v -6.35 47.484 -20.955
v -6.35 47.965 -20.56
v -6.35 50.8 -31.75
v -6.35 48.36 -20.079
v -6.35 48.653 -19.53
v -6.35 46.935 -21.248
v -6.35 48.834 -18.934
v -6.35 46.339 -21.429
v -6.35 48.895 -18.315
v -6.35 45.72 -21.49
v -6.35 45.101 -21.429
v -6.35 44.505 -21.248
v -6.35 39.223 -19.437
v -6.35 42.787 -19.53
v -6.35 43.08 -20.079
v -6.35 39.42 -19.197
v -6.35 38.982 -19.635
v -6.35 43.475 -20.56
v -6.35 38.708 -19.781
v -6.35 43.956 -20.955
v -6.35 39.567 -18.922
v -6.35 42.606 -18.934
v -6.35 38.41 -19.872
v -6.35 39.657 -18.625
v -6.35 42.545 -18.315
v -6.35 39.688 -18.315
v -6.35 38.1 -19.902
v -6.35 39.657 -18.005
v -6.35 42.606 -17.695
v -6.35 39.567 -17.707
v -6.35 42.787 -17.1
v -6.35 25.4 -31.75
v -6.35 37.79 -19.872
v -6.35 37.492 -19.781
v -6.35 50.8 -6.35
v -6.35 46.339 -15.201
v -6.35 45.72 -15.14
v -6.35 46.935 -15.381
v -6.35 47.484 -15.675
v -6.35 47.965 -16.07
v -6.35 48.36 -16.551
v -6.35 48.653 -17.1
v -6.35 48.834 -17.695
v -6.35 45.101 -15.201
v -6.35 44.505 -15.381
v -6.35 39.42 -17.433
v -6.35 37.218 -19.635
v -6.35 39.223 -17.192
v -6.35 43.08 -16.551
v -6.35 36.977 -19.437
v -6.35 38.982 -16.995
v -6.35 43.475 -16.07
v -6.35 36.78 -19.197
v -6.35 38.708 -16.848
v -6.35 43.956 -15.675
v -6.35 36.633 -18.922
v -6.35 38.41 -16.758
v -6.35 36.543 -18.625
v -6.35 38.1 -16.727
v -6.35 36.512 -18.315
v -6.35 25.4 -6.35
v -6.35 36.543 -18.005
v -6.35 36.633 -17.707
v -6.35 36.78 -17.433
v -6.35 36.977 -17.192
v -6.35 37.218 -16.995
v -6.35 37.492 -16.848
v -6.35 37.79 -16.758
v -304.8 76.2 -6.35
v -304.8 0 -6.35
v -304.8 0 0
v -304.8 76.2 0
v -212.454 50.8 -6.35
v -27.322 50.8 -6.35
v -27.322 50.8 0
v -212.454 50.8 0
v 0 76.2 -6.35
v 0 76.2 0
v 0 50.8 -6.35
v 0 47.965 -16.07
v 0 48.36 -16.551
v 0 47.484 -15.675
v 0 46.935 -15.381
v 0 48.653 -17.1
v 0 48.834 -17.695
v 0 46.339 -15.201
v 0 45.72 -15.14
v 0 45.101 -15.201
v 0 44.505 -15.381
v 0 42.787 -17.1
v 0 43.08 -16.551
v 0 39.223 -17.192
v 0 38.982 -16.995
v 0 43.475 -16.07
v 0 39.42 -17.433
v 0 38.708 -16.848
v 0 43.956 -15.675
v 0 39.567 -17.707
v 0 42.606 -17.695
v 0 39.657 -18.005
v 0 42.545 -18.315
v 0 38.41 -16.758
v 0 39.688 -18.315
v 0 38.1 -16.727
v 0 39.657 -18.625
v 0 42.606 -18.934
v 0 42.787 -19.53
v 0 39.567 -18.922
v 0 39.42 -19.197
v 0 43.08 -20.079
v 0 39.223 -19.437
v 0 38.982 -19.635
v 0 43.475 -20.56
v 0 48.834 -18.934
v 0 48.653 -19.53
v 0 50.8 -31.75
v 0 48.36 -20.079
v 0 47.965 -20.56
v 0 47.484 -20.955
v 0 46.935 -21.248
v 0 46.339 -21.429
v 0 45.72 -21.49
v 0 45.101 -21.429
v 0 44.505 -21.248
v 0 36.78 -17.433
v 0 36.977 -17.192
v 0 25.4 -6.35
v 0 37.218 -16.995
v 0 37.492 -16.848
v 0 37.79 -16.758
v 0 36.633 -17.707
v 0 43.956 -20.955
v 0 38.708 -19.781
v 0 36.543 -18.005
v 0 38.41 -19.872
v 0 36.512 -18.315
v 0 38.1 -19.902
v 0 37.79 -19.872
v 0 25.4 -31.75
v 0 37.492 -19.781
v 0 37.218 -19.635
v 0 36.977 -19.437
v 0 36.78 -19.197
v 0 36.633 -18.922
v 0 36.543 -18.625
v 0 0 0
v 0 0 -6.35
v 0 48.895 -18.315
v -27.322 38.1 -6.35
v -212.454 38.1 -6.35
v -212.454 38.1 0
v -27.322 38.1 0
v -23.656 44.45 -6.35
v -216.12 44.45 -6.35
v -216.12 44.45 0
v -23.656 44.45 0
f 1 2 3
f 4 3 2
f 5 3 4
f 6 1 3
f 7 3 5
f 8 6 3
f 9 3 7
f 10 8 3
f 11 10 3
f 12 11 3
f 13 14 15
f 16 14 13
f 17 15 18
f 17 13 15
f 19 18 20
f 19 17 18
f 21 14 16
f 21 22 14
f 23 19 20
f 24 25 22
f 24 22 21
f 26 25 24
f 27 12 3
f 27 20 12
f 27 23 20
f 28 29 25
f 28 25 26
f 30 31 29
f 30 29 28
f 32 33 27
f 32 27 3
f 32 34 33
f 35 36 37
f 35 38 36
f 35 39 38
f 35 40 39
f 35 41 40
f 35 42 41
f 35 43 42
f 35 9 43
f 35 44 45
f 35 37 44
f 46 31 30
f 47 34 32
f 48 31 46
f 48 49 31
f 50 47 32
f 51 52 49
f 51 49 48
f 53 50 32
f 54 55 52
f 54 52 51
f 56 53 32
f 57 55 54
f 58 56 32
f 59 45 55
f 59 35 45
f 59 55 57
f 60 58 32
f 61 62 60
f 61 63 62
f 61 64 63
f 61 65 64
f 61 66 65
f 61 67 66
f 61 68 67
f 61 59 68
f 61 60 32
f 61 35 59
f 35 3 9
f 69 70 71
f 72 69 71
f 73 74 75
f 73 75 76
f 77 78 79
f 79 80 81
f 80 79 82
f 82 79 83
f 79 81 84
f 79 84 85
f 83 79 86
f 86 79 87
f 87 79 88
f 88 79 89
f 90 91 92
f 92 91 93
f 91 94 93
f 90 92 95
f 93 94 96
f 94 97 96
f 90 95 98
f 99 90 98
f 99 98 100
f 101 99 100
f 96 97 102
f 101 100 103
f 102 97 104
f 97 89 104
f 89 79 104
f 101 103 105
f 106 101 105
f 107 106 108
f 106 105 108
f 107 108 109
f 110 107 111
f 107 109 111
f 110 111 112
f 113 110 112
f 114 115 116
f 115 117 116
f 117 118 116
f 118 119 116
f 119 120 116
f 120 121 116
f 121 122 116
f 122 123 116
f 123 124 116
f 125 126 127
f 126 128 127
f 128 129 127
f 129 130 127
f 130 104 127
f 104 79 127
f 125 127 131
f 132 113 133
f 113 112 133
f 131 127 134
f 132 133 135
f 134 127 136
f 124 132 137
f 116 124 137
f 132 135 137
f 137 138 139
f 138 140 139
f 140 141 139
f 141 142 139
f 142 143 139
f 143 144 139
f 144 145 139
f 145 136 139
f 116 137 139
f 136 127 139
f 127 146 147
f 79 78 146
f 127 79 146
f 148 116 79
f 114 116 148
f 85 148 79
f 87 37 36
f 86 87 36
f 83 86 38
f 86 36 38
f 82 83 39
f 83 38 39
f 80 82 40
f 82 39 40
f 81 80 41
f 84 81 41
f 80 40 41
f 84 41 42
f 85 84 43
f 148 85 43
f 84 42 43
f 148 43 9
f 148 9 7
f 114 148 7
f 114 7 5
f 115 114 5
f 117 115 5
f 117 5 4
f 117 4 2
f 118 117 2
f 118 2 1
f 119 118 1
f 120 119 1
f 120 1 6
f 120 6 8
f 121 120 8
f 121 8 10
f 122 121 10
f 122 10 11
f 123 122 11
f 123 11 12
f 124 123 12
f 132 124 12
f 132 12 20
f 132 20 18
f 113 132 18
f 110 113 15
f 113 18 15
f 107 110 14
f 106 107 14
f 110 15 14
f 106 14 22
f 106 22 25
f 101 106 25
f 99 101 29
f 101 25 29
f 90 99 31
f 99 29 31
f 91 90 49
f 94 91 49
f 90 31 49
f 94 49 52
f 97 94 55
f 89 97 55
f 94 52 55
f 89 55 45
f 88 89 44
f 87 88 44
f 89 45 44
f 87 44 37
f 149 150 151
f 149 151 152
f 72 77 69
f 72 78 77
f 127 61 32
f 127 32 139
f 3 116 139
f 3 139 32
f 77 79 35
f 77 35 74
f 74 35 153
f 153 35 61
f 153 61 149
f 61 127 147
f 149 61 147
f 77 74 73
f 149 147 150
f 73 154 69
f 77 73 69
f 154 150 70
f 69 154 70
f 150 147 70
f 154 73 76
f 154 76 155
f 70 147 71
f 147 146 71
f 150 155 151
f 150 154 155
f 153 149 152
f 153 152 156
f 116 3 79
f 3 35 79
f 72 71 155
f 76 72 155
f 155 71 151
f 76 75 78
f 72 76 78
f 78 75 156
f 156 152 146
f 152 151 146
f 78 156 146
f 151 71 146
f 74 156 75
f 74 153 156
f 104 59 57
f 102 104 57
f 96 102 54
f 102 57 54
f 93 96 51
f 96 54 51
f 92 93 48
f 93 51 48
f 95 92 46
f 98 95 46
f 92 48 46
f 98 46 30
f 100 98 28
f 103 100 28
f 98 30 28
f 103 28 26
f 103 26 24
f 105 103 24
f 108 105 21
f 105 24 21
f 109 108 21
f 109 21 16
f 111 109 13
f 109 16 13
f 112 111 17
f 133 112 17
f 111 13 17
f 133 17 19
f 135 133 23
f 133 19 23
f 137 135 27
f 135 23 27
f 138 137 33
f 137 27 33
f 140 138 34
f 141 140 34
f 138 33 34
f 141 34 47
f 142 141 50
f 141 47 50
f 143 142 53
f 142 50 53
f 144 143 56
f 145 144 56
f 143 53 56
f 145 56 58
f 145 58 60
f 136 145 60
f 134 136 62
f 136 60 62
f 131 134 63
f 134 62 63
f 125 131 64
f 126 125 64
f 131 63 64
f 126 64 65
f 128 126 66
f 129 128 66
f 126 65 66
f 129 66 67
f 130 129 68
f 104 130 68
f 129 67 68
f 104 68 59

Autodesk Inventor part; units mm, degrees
ref_plane "YZ Plane" through (0, 0, 0) normal (1, 0, 0) x (0, 1, 0)
ref_plane "XZ Plane" through (0, 0, 0) normal (0, 1, 0) x (-1, 0, 0)
ref_plane "XY Plane" through (0, 0, 0) normal (0, 0, 1) x (1, 0, 0)
sketch "Sketch1" plane through (0, 0, 0) normal (0, 1, 0) x (-1, 0, 0)
  line L0 (0, 0) -> (0, -6.35)
  line L1 (0, -6.35) -> (304.8, -6.35)
  line L2 (304.8, -6.35) -> (304.8, 0)
  line L3 (304.8, 0) -> (0, 0)
  dimension "d0" = 6.35
  dimension "d1" = 304.8
extrude "Extrusion1" add sketch "Sketch1" along normal blind 76.2
sketch "Sketch2" plane through (-304.8, 0, 0) normal (0, 0, 1) x (1, 0, 0)
  line L0 (273.812, 50.8) -> (96.012, 50.8)
  line L1 (96.012, 50.8) -> (96.012, 38.1)
  line L2 (96.012, 38.1) -> (273.812, 38.1)
  line L3 (273.812, 38.1) -> (273.812, 50.8)
  line L4 (96.012, 50.8) -> (35.1357, 42.2552)
  line L5 (35.1357, 42.2552) -> (36.5673, 32.0558)
  line L6 (36.5673, 32.0558) -> (97.4436, 40.6006)
  line L7 (97.4436, 40.6006) -> (96.012, 50.8)
  line L8 (0, 76.2) -> (304.8, 76.2) projected
  line L9 (304.8, 0) -> (304.8, 76.2) projected
  dimension "d4" = 177.8
  dimension "d5" = 12.7
  dimension "d24" = 25.4
  dimension "d25" = 30.988
sketch "Sketch3" plane through (-304.8, 0, 0) normal (0, 0, 1) x (1, 0, 0)
  point P0 (304.8, 0)
extrude "Extrusion2" cut sketch "Sketch2" against normal blind 6.35 contours L3 L2 L1 L6 L7 L0 | L7 L6 L1
sketch "Sketch4" plane through (-304.8, 0, 0) normal (0, 0, 1) x (1, 0, 0)
  point P0 (304.8, 0)
sketch "Sketch5" plane through (0, 0, -6.35) normal (0, 0, -1) x (-1, 0, 0)
  line L0 (0, 0) -> (0, 76.2) projected
  line L1 (0, 76.2) -> (6.35, 76.2)
  line L2 (6.35, 76.2) -> (6.35, 25.4)
  line L3 (6.35, 25.4) -> (0, 25.4)
  line L4 (0, 25.4) -> (0, 76.2)
  line L5 (0, 76.2) -> (304.8, 76.2) projected
  line L6 (0, 76.2) -> (6.35, 76.2)
  line L7 (6.35, 76.2) -> (6.35, 50.8)
  line L8 (6.35, 50.8) -> (0, 50.8)
  line L9 (0, 50.8) -> (0, 76.2)
  dimension "d8" = 6.35
  dimension "d9" = 50.8
  dimension "d11" = 25.4
extrude "Extrusion3" add sketch "Sketch5" along normal blind 25.4 contours L0 L8 L2 L3
sketch "Sketch6" plane through (-6.35, 25.4, -6.35) normal (-1, 0, 0) x (0, 0, 1)
  circle A0 centre (-11.9648, 20.32) radius 3.175
  circle A1 centre (-11.9648, 12.7) radius 1.5875
  line L0 (0, 0) -> (-25.4, 0) projected
  line L1 (-25.4, 25.4) -> (0, 25.4) projected
  point P0 (6.35, -25.4)
  dimension "d14" = 6.35
  dimension "d15" = 3.175
  dimension "d16" = 12.7
  dimension "d17" = 5.08
extrude "Extrusion4" cut sketch "Sketch6" against normal blind 6.35
sketch "Sketch7" plane through (0, 0, -6.35) normal (0, 0, -1) x (-1, 0, 0)
  line L0 (30.988, 38.1) -> (30.988, 50.8) projected
  line L1 (23.6557, 44.45) -> (27.3218, 50.8)
  line L2 (27.3218, 50.8) -> (34.6542, 50.8)
  line L3 (34.6542, 50.8) -> (38.3203, 44.45)
  line L4 (38.3203, 44.45) -> (34.6542, 38.1)
  line L5 (34.6542, 38.1) -> (27.3218, 38.1)
  line L6 (27.3218, 38.1) -> (23.6557, 44.45)
  line L7 (208.788, 50.8) -> (208.788, 38.1) projected
  line L8 (201.4557, 44.45) -> (205.1218, 50.8)
  line L9 (205.1218, 50.8) -> (212.4542, 50.8)
  line L10 (212.4542, 50.8) -> (216.1203, 44.45)
  line L11 (216.1203, 44.45) -> (212.4542, 38.1)
  line L12 (212.4542, 38.1) -> (205.1218, 38.1)
  line L13 (205.1218, 38.1) -> (201.4557, 44.45)
  point P0 (0, 0)
  point P1 (30.988, 44.45)
  point P2 (208.788, 44.45)
  dimension "d20" = 12.7
  dimension "d21" = 12.7
extrude "Extrusion5" cut sketch "Sketch7" against normal blind 6.35
properties part number "Plate add on"
